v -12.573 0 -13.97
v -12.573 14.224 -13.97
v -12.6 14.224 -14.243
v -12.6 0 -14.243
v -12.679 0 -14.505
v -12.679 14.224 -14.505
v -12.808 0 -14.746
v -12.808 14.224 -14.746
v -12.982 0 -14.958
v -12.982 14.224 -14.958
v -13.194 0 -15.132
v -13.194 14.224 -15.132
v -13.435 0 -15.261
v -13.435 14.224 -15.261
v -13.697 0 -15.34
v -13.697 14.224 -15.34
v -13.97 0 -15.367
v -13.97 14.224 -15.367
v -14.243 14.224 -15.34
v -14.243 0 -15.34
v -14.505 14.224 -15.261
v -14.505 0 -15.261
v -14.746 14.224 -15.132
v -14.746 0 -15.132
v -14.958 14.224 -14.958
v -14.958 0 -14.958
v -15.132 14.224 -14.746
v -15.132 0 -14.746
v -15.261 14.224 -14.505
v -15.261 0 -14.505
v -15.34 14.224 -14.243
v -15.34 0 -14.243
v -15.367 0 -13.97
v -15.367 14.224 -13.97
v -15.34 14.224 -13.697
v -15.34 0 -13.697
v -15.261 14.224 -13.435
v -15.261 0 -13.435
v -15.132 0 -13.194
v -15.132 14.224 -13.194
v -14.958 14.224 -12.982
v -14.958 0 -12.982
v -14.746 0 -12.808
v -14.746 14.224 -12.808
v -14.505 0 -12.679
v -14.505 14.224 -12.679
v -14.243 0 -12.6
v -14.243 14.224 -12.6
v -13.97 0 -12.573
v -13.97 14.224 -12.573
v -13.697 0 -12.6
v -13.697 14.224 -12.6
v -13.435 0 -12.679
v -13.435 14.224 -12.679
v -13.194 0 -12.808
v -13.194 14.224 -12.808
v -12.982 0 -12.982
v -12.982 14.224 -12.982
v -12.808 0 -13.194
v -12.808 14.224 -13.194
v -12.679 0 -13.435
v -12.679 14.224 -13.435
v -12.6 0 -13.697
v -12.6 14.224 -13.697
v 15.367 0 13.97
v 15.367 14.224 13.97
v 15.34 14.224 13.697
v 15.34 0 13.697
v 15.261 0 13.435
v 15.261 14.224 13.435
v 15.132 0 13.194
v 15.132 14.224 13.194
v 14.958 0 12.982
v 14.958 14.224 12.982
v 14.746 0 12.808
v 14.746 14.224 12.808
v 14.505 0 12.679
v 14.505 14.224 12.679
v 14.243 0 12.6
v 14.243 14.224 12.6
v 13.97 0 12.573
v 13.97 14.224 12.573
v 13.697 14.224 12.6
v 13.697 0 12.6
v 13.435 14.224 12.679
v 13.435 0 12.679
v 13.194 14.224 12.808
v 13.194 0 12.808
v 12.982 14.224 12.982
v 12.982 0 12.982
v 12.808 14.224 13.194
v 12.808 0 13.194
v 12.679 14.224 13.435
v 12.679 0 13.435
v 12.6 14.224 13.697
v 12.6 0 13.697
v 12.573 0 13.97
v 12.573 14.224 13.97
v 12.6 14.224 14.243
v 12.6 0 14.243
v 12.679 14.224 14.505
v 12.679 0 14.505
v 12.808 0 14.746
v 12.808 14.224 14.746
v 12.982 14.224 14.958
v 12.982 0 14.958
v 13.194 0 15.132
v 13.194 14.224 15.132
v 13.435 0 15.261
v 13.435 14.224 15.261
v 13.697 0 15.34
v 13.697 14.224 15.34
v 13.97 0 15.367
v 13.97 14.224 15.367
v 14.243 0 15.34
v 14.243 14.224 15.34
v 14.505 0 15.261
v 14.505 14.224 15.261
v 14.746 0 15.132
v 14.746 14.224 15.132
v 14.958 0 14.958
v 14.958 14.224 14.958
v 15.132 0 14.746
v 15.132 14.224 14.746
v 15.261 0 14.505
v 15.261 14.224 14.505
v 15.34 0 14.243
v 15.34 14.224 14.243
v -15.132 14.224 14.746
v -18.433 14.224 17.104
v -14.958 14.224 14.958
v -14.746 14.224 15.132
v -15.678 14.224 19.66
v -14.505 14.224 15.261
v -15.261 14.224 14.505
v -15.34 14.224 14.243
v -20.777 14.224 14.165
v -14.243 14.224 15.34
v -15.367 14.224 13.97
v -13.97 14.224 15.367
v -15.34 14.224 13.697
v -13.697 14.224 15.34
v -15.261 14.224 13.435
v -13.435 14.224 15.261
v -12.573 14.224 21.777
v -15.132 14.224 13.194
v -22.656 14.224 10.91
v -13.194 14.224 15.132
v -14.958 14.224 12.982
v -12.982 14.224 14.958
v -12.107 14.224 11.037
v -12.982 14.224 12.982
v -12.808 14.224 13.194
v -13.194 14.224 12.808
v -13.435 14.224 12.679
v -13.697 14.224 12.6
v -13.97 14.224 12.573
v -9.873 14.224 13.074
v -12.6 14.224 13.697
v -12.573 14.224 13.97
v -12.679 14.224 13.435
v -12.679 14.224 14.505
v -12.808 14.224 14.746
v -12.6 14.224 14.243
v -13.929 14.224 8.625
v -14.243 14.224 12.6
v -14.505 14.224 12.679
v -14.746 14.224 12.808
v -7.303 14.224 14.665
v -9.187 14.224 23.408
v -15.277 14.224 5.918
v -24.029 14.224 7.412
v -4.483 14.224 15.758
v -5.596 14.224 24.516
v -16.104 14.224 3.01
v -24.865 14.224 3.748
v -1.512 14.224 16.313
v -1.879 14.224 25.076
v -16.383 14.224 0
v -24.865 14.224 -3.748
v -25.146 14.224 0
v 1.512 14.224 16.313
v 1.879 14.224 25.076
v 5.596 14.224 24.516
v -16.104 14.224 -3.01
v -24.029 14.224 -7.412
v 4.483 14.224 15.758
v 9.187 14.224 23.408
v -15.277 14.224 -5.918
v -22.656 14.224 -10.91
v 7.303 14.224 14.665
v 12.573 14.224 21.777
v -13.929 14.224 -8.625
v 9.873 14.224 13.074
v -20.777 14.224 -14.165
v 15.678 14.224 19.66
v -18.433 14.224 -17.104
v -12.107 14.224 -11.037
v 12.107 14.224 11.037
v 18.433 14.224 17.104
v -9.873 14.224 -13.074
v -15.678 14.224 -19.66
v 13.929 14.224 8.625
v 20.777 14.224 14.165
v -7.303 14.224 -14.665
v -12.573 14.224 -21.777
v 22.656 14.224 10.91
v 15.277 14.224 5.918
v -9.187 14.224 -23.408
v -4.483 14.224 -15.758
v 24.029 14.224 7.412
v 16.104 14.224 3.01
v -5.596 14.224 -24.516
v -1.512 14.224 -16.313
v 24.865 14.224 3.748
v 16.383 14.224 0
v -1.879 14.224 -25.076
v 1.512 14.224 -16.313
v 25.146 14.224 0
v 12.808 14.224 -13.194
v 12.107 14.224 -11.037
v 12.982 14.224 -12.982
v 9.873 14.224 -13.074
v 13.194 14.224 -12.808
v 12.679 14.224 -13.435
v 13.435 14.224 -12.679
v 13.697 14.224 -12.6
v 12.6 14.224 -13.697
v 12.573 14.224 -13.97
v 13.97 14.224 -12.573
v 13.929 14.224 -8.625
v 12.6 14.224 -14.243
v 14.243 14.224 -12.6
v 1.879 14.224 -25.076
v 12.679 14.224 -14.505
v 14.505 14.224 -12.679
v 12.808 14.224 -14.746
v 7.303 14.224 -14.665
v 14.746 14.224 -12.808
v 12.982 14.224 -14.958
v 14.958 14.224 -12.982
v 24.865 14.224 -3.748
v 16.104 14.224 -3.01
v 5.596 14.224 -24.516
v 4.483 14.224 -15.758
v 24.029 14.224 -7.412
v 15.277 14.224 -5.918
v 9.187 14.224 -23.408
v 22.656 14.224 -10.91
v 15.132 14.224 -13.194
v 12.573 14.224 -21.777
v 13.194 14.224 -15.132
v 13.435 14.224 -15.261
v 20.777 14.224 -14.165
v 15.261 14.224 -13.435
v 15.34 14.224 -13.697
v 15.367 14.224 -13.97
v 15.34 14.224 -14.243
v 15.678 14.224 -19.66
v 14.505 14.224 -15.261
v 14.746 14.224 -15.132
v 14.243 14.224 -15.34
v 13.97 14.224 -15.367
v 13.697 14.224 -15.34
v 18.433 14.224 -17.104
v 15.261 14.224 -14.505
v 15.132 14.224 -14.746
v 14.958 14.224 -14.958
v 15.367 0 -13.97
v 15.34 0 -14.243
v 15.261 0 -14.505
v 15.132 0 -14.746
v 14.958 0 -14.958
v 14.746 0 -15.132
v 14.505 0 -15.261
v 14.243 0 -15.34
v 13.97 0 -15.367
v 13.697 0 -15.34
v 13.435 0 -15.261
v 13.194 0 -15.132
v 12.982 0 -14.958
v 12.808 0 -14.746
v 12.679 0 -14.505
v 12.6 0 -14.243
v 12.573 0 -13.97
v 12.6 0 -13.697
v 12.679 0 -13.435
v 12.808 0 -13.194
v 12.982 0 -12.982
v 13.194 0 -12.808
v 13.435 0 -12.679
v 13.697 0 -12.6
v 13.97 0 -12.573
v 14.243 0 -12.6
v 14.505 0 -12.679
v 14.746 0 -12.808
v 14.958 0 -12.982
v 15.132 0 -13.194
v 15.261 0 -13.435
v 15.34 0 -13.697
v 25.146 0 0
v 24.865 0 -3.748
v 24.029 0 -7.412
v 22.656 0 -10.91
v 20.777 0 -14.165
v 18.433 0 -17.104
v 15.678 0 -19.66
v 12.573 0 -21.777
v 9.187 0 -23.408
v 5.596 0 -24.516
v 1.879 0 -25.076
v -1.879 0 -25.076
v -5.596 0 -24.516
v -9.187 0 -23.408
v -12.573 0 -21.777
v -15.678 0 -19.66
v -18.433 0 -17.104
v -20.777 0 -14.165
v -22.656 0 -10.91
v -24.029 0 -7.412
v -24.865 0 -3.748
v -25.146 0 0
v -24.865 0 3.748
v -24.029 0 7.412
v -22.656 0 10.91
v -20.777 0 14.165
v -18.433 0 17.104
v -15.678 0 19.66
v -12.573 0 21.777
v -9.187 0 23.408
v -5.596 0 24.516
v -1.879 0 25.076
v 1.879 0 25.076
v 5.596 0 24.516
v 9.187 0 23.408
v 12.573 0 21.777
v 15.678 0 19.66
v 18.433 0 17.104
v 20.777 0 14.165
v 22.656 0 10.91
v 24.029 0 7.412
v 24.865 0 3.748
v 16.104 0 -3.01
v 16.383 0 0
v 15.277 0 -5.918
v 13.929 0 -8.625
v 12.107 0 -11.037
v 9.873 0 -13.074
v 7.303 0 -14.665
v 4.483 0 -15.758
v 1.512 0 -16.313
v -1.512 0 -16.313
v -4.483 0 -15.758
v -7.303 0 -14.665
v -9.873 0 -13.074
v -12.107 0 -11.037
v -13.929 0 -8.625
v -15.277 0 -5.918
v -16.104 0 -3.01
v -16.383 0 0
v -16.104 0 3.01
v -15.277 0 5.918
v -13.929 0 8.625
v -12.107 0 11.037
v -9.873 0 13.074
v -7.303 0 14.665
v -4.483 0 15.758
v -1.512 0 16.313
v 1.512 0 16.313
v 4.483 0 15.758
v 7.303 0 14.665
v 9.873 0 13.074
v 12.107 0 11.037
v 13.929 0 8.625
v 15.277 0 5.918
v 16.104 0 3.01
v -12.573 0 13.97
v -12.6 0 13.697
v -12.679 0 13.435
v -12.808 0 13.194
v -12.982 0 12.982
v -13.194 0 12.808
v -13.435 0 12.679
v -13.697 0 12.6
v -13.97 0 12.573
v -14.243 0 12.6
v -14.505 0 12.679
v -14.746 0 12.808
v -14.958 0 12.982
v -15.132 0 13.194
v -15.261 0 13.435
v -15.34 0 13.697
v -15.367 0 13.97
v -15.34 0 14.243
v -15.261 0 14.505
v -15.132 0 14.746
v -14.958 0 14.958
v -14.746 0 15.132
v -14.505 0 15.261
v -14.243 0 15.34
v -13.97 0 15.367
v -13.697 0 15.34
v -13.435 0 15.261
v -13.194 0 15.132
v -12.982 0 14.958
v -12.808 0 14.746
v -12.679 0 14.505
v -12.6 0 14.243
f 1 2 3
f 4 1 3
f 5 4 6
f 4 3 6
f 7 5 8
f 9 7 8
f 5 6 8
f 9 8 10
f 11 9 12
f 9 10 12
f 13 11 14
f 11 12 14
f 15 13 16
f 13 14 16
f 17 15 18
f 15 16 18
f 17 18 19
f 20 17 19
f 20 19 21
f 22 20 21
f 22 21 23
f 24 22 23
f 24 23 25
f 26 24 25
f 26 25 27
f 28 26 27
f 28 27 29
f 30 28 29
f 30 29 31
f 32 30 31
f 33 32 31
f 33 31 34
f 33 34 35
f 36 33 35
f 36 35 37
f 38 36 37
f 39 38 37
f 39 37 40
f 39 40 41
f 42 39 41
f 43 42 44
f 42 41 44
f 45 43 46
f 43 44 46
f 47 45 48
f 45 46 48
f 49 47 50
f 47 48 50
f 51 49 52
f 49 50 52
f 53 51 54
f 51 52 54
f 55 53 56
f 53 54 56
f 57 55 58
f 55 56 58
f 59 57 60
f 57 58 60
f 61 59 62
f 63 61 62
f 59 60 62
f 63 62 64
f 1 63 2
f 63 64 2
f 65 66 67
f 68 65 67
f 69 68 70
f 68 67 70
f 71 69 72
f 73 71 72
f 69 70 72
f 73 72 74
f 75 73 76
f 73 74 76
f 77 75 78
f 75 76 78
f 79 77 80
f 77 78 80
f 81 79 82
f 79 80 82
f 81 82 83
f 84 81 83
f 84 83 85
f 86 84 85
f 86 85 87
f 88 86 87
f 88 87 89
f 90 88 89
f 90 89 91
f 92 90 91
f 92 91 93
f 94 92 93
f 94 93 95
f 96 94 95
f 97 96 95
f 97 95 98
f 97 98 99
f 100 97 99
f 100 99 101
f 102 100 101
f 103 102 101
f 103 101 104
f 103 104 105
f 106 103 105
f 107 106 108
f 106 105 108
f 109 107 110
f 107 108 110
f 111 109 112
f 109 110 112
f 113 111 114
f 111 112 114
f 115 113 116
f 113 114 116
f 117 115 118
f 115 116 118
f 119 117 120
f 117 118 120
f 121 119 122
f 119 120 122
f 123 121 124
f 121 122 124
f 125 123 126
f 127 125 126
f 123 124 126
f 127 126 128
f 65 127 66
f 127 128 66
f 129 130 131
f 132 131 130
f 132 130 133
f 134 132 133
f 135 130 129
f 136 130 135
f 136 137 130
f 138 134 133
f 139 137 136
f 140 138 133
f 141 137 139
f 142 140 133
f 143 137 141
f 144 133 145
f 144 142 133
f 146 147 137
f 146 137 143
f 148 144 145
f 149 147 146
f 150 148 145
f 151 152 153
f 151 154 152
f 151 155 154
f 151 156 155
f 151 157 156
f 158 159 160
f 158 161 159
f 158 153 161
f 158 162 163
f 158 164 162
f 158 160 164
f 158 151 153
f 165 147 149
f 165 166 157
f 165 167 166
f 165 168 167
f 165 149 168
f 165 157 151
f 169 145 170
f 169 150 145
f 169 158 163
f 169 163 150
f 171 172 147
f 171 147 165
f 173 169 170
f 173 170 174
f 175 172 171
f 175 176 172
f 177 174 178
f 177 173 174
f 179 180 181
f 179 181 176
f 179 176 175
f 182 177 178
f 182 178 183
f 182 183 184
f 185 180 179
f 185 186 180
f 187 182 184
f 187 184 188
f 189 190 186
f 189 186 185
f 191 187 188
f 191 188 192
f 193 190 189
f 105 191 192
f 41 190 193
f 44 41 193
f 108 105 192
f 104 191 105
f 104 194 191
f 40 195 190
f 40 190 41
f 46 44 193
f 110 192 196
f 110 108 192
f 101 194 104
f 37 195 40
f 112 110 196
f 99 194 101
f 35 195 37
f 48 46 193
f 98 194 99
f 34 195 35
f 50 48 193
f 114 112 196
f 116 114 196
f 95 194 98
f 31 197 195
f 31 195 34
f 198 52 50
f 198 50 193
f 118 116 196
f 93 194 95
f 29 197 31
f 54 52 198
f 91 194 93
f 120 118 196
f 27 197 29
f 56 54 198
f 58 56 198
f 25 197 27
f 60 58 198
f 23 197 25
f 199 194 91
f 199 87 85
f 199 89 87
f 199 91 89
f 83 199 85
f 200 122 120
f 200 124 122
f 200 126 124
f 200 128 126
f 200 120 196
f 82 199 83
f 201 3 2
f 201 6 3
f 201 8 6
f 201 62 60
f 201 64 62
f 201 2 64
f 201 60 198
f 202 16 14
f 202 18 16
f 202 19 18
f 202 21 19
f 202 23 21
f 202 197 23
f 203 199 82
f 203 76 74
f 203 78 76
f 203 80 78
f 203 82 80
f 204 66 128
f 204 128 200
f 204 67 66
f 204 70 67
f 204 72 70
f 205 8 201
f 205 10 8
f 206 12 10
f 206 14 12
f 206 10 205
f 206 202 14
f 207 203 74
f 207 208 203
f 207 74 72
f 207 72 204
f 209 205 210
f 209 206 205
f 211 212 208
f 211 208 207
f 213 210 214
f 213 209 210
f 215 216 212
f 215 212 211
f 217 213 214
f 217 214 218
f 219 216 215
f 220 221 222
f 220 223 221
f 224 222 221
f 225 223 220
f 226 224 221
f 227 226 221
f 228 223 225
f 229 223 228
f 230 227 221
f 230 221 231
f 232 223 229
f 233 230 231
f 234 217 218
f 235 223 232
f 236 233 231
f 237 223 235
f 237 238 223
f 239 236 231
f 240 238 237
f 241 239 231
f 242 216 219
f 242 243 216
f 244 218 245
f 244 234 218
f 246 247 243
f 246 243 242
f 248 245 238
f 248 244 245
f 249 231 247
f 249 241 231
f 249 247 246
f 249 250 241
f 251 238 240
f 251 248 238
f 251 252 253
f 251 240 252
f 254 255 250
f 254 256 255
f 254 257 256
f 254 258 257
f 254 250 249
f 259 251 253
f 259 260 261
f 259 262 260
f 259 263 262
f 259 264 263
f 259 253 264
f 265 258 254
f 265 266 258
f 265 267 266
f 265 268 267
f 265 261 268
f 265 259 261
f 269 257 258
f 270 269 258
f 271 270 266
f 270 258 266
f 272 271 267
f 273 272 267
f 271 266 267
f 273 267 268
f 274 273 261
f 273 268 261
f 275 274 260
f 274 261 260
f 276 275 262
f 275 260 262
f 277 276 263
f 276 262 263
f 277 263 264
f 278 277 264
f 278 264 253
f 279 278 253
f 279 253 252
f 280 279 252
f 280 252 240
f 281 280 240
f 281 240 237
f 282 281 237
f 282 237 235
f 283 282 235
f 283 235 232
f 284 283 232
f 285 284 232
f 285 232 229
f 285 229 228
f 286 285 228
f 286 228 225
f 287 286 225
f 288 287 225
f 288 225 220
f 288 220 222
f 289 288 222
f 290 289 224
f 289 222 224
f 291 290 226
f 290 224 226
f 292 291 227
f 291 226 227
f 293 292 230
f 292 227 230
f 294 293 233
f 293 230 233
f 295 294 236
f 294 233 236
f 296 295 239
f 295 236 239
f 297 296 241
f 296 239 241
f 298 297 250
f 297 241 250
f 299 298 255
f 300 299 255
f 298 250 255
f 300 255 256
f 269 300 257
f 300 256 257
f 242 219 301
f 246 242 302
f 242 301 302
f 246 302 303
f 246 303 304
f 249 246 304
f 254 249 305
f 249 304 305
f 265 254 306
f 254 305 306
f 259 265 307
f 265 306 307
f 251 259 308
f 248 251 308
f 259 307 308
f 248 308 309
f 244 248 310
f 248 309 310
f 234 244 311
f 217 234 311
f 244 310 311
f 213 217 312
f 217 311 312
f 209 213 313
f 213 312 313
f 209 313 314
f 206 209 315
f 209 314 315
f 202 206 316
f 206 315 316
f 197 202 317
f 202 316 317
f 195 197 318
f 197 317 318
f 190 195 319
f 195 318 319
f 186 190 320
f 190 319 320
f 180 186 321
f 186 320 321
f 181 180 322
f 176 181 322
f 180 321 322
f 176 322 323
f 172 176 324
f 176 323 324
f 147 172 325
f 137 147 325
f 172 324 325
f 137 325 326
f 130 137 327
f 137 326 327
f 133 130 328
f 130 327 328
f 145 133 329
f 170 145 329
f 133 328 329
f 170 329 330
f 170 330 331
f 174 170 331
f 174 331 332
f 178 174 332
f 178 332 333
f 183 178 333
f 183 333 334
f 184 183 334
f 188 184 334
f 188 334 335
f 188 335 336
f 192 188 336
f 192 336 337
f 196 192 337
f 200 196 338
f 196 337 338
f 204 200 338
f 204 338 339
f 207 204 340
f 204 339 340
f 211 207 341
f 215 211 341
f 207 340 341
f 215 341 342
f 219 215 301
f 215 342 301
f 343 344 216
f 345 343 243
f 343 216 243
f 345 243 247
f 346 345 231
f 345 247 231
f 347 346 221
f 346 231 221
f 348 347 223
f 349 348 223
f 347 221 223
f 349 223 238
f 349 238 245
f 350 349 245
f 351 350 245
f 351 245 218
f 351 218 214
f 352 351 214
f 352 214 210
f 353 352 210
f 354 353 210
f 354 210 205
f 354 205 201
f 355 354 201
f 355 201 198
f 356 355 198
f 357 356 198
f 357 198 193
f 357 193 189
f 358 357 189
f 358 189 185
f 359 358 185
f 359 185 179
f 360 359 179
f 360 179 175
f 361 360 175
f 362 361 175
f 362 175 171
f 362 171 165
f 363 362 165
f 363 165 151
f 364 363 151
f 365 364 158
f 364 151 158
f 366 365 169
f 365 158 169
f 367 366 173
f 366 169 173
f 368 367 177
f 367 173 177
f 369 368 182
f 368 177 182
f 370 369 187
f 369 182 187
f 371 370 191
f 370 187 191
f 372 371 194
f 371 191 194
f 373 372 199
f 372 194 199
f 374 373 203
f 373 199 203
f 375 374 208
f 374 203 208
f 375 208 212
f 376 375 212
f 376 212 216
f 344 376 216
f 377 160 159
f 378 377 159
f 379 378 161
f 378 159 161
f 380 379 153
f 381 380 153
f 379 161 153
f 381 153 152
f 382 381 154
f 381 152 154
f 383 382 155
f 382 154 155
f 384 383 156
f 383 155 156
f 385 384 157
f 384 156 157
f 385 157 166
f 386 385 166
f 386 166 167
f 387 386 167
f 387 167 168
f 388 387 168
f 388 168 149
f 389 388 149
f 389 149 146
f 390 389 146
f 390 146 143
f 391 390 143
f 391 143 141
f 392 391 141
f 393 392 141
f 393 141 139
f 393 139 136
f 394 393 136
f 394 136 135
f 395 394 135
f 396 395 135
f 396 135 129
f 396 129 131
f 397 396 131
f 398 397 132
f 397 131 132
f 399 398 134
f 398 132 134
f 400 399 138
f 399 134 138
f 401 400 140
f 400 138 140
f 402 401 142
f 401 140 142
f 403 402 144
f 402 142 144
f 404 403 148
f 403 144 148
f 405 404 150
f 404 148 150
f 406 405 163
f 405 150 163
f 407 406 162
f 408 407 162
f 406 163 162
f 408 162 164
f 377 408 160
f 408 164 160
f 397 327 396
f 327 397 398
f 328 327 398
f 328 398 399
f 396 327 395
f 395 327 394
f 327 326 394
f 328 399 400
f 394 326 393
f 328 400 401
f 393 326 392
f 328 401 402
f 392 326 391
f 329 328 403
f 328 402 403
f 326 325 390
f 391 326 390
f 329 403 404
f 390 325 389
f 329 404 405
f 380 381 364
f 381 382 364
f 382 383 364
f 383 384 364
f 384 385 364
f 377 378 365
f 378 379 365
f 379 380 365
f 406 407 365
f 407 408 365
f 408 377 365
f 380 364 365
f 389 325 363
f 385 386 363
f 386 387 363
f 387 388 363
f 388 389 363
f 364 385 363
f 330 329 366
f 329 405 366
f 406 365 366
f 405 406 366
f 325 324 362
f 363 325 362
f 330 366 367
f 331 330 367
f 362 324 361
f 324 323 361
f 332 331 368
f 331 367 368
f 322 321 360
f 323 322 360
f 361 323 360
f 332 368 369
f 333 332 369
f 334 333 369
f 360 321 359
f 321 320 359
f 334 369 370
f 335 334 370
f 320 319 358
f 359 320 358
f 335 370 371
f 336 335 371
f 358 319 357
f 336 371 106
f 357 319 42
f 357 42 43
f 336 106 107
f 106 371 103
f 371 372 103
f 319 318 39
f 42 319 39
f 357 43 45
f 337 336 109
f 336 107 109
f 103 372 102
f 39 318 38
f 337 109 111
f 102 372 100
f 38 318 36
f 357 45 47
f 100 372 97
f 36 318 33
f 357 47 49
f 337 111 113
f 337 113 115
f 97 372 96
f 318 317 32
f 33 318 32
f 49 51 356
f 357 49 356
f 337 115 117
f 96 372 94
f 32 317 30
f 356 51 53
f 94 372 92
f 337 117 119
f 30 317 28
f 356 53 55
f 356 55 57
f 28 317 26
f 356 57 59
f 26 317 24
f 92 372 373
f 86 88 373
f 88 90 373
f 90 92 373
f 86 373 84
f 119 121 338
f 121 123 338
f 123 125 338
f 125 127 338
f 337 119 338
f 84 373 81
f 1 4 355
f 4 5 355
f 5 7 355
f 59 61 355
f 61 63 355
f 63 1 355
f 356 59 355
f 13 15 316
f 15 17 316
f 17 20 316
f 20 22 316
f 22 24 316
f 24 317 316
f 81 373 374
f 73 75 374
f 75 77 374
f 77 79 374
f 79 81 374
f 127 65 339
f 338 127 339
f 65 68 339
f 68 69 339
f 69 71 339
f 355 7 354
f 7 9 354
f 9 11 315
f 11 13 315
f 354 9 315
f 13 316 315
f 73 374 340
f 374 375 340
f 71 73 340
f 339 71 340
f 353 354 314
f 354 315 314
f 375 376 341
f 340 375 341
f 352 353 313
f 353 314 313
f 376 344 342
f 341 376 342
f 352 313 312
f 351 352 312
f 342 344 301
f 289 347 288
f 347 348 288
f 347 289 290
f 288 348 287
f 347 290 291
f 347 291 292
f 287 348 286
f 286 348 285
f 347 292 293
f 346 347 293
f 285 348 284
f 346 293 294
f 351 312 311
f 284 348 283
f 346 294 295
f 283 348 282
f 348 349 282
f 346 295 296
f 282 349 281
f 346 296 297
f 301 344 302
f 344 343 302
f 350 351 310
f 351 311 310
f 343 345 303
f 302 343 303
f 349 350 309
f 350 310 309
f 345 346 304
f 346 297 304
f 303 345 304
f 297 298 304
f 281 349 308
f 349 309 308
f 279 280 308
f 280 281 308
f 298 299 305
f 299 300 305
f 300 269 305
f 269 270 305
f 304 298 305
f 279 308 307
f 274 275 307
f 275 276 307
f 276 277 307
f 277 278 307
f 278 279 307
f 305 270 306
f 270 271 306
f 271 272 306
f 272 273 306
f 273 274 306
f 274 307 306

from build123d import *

# Parameters (mm, degrees)
SKETCH1_R           = 25.146
BOSS_EXTRUDE1_DEPTH = 14.224
CUT_EXTRUDE1_REACH  = 16.224
SKETCH2_R           = 1.397
CUT_EXTRUDE2_REACH  = 16.224
SKETCH3_R           = 16.383


with BuildPart() as part:
    # Sketch1 → Boss-Extrude1 (new body)
    with BuildSketch(Plane(origin=(0, 0, 0), x_dir=(1, 0, 0), z_dir=(0, 1, 0))):
        Circle(SKETCH1_R)
    extrude(amount=BOSS_EXTRUDE1_DEPTH)

    # Sketch2 → Cut-Extrude1 (cut, up to next)
    with BuildSketch(Plane(origin=(0, 14.224, 0), x_dir=(1, 0, 0), z_dir=(0, 1, 0)), mode=Mode.PRIVATE) as cut_extrude1_sk1:
        with Locations((13.97, 13.97)):
            Circle(SKETCH2_R)
    cut_extrude1_tool1 = extrude(cut_extrude1_sk1.sketch, amount=-CUT_EXTRUDE1_REACH, mode=Mode.PRIVATE) & part.part
    add(cut_extrude1_tool1.solids().sort_by_distance((13.97, 14.224, -13.97))[0], mode=Mode.SUBTRACT)
    # Sketch2 → Cut-Extrude1 (cut, up to next)
    with BuildSketch(Plane(origin=(0, 14.224, 0), x_dir=(1, 0, 0), z_dir=(0, 1, 0)), mode=Mode.PRIVATE) as cut_extrude1_sk2:
        with Locations((13.97, -13.97)):
            Circle(SKETCH2_R)
    cut_extrude1_tool2 = extrude(cut_extrude1_sk2.sketch, amount=-CUT_EXTRUDE1_REACH, mode=Mode.PRIVATE) & part.part
    add(cut_extrude1_tool2.solids().sort_by_distance((13.97, 14.224, 13.97))[0], mode=Mode.SUBTRACT)
    # Sketch2 → Cut-Extrude1 (cut, up to next)
    with BuildSketch(Plane(origin=(0, 14.224, 0), x_dir=(1, 0, 0), z_dir=(0, 1, 0)), mode=Mode.PRIVATE) as cut_extrude1_sk3:
        with Locations((-13.97, -13.97)):
            Circle(SKETCH2_R)
    cut_extrude1_tool3 = extrude(cut_extrude1_sk3.sketch, amount=-CUT_EXTRUDE1_REACH, mode=Mode.PRIVATE) & part.part
    add(cut_extrude1_tool3.solids().sort_by_distance((-13.97, 14.224, 13.97))[0], mode=Mode.SUBTRACT)
    # Sketch2 → Cut-Extrude1 (cut, up to next)
    with BuildSketch(Plane(origin=(0, 14.224, 0), x_dir=(1, 0, 0), z_dir=(0, 1, 0)), mode=Mode.PRIVATE) as cut_extrude1_sk4:
        with Locations((-13.97, 13.97)):
            Circle(SKETCH2_R)
    cut_extrude1_tool4 = extrude(cut_extrude1_sk4.sketch, amount=-CUT_EXTRUDE1_REACH, mode=Mode.PRIVATE) & part.part
    add(cut_extrude1_tool4.solids().sort_by_distance((-13.97, 14.224, -13.97))[0], mode=Mode.SUBTRACT)

    # Sketch3 → Cut-Extrude2 (cut, up to next)
    with BuildSketch(Plane(origin=(0, 14.224, 0), x_dir=(1, 0, 0), z_dir=(0, 1, 0)), mode=Mode.PRIVATE) as cut_extrude2_sk1:
        Circle(SKETCH3_R)
    cut_extrude2_tool1 = extrude(cut_extrude2_sk1.sketch, amount=-CUT_EXTRUDE2_REACH, mode=Mode.PRIVATE) & part.part
    add(cut_extrude2_tool1.solids().sort_by_distance((0, 14.224, 0))[0], mode=Mode.SUBTRACT)


solid = part.part
